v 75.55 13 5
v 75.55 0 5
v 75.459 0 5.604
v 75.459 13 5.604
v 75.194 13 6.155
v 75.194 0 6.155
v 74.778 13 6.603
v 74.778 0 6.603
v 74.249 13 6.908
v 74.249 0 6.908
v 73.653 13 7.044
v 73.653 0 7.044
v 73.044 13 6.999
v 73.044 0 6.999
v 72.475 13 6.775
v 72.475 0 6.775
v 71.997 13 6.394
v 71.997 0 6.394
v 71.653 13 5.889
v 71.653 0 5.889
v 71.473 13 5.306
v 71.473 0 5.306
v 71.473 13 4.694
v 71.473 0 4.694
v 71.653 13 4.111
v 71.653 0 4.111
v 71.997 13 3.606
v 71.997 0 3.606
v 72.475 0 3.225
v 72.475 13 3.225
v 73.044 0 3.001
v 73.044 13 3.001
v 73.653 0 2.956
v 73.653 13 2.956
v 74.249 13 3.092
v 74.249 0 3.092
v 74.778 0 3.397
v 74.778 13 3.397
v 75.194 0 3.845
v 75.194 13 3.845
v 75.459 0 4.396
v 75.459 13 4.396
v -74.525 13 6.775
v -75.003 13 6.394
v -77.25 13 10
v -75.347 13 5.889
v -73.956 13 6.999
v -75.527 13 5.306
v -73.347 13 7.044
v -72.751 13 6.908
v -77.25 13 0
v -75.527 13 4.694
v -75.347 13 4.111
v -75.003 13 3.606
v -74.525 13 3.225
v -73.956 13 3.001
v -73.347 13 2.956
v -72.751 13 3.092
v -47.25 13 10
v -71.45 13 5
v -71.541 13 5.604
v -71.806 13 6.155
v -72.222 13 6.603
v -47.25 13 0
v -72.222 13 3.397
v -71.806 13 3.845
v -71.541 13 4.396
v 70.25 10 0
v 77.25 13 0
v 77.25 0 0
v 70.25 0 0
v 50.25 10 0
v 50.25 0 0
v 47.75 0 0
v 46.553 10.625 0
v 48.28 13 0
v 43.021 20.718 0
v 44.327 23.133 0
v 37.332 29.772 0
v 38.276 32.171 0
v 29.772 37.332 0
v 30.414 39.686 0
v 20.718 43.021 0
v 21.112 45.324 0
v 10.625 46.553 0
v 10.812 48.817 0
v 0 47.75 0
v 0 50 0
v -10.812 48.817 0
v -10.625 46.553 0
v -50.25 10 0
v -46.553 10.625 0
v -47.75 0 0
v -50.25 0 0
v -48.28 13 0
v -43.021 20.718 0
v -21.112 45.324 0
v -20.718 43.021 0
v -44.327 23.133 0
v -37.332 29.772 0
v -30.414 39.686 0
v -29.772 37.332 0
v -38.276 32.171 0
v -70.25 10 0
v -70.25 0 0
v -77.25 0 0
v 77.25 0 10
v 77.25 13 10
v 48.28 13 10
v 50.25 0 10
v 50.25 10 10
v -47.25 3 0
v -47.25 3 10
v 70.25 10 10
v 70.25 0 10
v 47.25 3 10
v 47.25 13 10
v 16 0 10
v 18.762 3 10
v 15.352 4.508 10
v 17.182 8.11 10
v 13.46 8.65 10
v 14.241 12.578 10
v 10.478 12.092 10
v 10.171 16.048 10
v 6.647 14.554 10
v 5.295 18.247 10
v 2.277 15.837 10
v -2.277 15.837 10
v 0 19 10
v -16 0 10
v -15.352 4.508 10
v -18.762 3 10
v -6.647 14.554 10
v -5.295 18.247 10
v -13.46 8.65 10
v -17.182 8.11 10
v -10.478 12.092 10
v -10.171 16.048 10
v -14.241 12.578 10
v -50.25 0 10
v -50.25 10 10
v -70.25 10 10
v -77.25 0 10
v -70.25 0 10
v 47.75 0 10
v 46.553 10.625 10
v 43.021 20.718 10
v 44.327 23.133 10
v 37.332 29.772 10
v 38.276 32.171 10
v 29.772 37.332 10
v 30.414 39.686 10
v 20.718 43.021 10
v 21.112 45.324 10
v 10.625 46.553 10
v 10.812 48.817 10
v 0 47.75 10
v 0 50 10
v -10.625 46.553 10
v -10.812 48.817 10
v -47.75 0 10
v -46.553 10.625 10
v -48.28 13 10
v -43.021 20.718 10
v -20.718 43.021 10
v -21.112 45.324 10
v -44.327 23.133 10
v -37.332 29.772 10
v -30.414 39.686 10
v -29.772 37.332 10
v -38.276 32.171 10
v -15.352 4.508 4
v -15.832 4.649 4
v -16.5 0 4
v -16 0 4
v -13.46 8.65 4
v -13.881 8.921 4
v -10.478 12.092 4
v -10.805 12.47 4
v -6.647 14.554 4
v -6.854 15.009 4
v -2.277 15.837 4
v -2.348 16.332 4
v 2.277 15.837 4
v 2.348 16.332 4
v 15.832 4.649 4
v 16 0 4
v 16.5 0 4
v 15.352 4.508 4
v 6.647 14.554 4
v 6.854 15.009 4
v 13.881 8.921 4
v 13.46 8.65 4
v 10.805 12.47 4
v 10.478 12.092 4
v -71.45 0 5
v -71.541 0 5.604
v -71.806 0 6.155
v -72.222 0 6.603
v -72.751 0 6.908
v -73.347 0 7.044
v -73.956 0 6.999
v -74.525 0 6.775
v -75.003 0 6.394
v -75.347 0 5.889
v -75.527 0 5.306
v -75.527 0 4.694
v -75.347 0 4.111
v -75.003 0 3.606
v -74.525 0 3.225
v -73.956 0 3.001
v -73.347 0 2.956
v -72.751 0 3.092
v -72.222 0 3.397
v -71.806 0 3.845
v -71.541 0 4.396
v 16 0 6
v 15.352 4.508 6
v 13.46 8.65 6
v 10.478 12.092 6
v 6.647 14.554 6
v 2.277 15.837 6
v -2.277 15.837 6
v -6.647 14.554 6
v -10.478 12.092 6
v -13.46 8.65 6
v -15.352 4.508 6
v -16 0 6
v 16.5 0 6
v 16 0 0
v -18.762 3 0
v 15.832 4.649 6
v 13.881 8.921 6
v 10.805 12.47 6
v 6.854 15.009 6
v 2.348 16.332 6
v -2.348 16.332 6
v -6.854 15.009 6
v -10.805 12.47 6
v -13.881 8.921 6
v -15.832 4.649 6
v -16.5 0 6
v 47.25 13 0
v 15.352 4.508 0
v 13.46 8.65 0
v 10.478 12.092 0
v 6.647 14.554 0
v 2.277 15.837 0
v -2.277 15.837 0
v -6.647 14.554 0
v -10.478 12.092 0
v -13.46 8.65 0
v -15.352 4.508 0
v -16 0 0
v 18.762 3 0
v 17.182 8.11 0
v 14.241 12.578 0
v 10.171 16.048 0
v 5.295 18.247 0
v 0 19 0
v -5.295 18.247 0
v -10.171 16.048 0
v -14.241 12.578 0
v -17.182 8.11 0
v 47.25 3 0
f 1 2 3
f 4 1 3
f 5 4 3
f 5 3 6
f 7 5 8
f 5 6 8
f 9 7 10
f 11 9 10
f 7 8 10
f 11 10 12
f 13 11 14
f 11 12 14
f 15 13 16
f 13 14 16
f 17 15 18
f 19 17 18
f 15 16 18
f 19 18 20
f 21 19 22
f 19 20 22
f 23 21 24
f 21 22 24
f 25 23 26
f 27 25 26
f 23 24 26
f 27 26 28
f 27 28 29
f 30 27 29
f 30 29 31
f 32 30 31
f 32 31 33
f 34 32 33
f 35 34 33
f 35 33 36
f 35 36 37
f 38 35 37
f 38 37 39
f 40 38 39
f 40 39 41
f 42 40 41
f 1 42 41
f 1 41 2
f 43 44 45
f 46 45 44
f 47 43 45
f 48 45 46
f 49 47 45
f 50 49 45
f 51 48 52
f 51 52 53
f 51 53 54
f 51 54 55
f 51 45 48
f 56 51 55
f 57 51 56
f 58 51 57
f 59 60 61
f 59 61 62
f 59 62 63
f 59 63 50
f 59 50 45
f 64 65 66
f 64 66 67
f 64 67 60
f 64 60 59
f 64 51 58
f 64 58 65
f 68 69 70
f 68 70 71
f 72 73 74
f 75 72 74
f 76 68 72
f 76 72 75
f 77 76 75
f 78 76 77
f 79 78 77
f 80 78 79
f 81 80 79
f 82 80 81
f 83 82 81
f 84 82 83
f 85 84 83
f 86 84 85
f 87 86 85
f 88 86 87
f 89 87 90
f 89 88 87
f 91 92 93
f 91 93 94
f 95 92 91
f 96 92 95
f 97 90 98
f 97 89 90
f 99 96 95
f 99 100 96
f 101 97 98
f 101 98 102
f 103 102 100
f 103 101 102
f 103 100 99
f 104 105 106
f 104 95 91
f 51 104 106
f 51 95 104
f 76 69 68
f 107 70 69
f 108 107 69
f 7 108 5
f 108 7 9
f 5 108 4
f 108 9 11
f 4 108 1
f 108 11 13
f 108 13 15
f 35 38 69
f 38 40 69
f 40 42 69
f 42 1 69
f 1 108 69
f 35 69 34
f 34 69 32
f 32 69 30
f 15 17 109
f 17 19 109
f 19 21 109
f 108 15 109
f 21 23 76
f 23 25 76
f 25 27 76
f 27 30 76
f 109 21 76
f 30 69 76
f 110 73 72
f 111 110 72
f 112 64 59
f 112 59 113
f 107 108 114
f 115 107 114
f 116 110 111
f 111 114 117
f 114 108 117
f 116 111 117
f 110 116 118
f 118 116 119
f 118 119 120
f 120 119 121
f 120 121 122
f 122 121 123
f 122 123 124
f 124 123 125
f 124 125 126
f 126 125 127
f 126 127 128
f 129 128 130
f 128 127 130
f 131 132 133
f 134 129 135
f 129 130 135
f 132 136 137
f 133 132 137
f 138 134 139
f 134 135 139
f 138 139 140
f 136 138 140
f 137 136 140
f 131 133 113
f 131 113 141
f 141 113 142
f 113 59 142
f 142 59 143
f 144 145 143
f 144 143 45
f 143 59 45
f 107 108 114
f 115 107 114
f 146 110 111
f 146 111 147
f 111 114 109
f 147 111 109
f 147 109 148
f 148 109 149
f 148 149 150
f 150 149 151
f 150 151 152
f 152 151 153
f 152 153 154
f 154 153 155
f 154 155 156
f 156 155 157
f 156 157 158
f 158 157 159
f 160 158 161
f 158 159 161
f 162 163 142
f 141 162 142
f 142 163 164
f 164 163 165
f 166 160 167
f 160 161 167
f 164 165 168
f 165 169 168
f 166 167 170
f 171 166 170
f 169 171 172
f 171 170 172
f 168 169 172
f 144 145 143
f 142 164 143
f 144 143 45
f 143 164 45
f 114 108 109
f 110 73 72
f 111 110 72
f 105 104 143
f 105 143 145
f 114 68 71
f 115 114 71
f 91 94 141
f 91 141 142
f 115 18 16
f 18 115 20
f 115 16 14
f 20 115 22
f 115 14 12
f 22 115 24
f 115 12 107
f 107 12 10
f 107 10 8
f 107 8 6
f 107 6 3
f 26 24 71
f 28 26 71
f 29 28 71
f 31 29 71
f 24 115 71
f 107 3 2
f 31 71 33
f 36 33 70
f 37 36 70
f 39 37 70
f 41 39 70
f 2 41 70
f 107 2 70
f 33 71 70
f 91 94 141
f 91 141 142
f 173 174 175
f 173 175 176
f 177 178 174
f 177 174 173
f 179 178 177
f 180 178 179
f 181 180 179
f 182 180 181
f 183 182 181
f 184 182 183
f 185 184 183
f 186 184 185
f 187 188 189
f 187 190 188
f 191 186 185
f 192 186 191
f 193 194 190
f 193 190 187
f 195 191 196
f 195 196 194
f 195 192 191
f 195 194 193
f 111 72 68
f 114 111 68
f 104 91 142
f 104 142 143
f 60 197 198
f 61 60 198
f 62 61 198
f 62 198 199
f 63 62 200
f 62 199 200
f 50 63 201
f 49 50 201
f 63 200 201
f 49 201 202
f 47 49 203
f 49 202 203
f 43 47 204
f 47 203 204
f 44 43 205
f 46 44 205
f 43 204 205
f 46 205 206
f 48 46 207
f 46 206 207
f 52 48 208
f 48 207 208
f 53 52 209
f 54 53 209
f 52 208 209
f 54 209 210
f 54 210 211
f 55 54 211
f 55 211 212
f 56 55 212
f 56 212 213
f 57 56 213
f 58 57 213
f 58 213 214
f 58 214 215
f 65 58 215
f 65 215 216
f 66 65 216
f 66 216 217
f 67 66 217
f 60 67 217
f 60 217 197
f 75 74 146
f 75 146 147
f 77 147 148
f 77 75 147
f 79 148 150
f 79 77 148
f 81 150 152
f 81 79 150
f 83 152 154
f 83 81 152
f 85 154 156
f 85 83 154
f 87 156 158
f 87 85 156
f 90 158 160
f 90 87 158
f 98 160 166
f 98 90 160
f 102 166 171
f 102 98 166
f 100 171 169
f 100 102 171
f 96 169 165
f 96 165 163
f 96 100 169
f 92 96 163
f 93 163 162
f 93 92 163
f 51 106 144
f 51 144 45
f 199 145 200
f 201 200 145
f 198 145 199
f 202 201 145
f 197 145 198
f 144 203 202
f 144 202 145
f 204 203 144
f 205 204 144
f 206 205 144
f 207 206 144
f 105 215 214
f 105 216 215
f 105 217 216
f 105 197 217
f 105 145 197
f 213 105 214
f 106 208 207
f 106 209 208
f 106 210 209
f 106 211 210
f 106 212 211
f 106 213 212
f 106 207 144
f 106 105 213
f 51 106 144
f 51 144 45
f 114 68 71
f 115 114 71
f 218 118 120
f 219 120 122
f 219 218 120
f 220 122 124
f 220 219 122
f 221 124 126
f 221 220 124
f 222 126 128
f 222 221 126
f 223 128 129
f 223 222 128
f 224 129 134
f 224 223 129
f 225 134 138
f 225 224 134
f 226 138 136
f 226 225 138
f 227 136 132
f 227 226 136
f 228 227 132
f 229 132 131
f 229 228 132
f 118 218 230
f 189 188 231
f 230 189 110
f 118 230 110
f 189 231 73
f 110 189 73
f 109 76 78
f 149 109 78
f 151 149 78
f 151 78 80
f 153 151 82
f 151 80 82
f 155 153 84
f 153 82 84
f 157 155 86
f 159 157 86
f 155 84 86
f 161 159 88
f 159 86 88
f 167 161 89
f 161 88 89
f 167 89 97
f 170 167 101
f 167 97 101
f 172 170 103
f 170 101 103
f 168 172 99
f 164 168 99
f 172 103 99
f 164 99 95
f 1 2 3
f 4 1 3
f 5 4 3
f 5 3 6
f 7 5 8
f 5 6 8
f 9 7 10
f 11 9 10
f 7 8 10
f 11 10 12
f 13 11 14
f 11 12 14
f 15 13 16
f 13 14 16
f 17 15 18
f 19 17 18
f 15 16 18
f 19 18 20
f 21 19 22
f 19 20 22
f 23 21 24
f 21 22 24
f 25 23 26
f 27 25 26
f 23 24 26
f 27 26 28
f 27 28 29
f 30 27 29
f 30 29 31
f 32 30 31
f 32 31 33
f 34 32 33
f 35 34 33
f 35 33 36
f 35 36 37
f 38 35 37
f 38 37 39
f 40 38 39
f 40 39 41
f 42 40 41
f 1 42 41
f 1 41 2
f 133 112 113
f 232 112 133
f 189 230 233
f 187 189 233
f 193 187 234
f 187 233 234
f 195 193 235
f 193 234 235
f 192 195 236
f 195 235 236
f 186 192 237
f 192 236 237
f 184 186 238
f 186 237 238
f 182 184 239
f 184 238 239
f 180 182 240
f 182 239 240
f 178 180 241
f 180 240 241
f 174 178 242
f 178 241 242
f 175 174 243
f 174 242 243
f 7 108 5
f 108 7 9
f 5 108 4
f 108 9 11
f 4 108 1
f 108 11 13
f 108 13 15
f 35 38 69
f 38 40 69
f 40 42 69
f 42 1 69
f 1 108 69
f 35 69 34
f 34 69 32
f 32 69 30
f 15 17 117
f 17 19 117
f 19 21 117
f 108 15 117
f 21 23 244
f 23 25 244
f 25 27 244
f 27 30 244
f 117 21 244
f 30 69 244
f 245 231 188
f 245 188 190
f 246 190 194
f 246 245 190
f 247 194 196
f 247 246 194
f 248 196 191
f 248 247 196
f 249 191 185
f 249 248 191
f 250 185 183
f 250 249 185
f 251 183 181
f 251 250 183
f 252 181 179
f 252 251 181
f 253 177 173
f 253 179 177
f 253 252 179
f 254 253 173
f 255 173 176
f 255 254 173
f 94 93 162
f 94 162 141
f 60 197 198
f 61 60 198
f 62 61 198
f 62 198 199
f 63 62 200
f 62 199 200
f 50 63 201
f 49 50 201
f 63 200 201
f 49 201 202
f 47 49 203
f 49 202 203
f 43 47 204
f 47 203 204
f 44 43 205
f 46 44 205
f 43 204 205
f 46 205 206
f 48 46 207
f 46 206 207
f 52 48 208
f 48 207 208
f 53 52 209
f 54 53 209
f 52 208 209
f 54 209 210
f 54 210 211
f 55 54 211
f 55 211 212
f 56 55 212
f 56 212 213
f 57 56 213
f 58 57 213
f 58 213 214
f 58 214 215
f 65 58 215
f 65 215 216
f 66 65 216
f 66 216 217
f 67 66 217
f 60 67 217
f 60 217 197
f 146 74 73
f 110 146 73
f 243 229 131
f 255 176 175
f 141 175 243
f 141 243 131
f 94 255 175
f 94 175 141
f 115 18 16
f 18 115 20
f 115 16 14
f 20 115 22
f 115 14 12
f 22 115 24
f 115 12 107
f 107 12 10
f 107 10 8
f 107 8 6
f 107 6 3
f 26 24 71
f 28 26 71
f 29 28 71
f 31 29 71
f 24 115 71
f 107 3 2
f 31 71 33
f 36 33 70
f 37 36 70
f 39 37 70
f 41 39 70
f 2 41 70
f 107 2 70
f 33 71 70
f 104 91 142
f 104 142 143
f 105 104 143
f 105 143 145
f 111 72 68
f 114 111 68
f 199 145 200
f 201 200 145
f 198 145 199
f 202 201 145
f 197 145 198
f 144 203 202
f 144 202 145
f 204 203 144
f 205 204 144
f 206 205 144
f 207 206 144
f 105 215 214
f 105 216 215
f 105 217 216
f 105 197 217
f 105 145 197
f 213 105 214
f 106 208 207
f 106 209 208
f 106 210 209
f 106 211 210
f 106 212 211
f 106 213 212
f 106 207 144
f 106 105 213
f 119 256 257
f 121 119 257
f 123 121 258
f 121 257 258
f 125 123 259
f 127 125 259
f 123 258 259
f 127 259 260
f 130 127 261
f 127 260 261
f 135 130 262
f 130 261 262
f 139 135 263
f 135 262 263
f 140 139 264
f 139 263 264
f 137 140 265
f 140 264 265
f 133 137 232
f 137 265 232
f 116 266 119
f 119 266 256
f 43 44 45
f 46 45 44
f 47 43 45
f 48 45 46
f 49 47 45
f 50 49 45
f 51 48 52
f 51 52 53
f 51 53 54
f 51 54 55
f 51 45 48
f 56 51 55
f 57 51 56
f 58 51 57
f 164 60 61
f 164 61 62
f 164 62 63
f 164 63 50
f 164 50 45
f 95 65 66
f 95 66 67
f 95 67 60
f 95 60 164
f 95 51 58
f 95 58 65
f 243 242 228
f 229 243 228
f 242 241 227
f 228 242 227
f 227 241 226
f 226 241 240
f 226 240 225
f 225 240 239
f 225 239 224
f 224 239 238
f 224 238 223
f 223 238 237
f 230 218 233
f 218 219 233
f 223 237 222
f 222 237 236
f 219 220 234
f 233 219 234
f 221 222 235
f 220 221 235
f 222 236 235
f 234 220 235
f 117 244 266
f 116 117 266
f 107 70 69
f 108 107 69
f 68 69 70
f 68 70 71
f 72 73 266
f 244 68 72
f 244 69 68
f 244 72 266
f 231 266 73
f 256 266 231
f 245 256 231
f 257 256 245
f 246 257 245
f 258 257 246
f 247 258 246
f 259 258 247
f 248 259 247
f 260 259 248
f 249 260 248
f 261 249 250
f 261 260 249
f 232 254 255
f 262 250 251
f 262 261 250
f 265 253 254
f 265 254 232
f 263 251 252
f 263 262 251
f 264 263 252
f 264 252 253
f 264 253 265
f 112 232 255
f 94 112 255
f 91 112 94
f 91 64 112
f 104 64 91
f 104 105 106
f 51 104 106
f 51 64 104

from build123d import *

# Parameters (mm, degrees)
PAD_DEPTH      = 10
SKETCH004_R    = 2.05
HOLE_DEPTH     = 25
SKETCH006_R    = 16.5
POCKET_DEPTH   = 2
PAD001_DEPTH   = 10
SKETCH005_R    = 2.05
HOLE001_DEPTH  = 25
HOLE001_TIPS_R = 2.05


with BuildPart() as pedfleshalsholder:
    # Sketch → Pad (new body)
    with BuildSketch(Plane.XY):
        with BuildLine():
            ThreePointArc((16, 0), (0, 16), (-16, 0))
            Line((-16, 0), (-50.25, 0))
            Line((-50.25, 0), (-50.25, 10))
            Line((-50.25, 10), (-70.25, 10))
            Line((-70.25, 10), (-70.25, 0))
            Line((-70.25, 0), (-77.25, 0))
            Line((-77.25, 0), (-77.25, 13))
            Line((-77.25, 13), (-47.25, 13))
            Line((-47.25, 13), (-47.25, 3))
            Line((-47.25, 3), (-18.761663, 3))
            ThreePointArc((18.761663, 3), (0, 19), (-18.761663, 3))
            Line((47.25, 3), (18.761663, 3))
            Line((47.25, 13), (47.25, 3))
            Line((77.25, 13), (47.25, 13))
            Line((77.25, 0), (77.25, 13))
            Line((70.25, 0), (77.25, 0))
            Line((70.25, 10), (70.25, 0))
            Line((50.25, 10), (70.25, 10))
            Line((50.25, 0), (50.25, 10))
            Line((16, 0), (50.25, 0))
        make_face()
    extrude(amount=PAD_DEPTH)

    # Sketch004 → Hole (cut)
    with BuildSketch(Plane.XZ):
        with Locations((-73.5, 5)):
            Circle(SKETCH004_R)
        with Locations((73.5, 5)):
            Circle(SKETCH004_R)
    extrude(amount=-HOLE_DEPTH, mode=Mode.SUBTRACT)

    # Sketch006 → Pocket (cut)
    with BuildSketch(Plane.XY.offset(6)):
        Circle(SKETCH006_R)
    extrude(amount=-POCKET_DEPTH, mode=Mode.SUBTRACT)


with BuildPart() as pedflesbodyholder:
    # Sketch003 → Pad001 (new body)
    with BuildSketch(Plane.XY):
        with BuildLine():
            ThreePointArc((47.75, 0), (0, 47.75), (-47.75, 0))
            Line((-47.75, 0), (-50.25, 0))
            Line((-50.25, 0), (-50.25, 10))
            Line((-50.25, 10), (-70.25, 10))
            Line((-70.25, 10), (-70.25, 0))
            Line((-70.25, 0), (-77.25, 0))
            Line((-77.25, 0), (-77.25, 13))
            Line((-77.25, 13), (-48.280431, 13))
            ThreePointArc((48.280431, 13), (0, 50), (-48.280431, 13))
            Line((77.25, 13), (48.280431, 13))
            Line((77.25, 0), (77.25, 13))
            Line((70.25, 0), (77.25, 0))
            Line((70.25, 10), (70.25, 0))
            Line((50.25, 10), (70.25, 10))
            Line((50.25, 0), (50.25, 10))
            Line((47.75, 0), (50.25, 0))
        make_face()
    extrude(amount=PAD001_DEPTH)

    # Sketch005 → Hole001 (cut)
    with BuildSketch(Plane.XZ):
        with Locations((-73.5, 5)):
            Circle(SKETCH005_R)
        with Locations((73.5, 5)):
            Circle(SKETCH005_R)
    extrude(amount=-HOLE001_DEPTH, mode=Mode.SUBTRACT)

    # Hole001 tips → Hole001 tip 1 section 0
    with BuildSketch(Plane.XZ.offset(-25), mode=Mode.PRIVATE) as hole001_tip_1_s0:
        with Locations((-73.5, 5)):
            Circle(HOLE001_TIPS_R)
    loft([hole001_tip_1_s0.sketch, Vertex(-73.5, 26.231764, 5)], mode=Mode.SUBTRACT)

    # Hole001 tips → Hole001 tip 2 section 0
    with BuildSketch(Plane.XZ.offset(-25), mode=Mode.PRIVATE) as hole001_tip_2_s0:
        with Locations((73.5, 5)):
            Circle(HOLE001_TIPS_R)
    loft([hole001_tip_2_s0.sketch, Vertex(73.5, 26.231764, 5)], mode=Mode.SUBTRACT)


solid = Compound([pedfleshalsholder.part, pedflesbodyholder.part])
